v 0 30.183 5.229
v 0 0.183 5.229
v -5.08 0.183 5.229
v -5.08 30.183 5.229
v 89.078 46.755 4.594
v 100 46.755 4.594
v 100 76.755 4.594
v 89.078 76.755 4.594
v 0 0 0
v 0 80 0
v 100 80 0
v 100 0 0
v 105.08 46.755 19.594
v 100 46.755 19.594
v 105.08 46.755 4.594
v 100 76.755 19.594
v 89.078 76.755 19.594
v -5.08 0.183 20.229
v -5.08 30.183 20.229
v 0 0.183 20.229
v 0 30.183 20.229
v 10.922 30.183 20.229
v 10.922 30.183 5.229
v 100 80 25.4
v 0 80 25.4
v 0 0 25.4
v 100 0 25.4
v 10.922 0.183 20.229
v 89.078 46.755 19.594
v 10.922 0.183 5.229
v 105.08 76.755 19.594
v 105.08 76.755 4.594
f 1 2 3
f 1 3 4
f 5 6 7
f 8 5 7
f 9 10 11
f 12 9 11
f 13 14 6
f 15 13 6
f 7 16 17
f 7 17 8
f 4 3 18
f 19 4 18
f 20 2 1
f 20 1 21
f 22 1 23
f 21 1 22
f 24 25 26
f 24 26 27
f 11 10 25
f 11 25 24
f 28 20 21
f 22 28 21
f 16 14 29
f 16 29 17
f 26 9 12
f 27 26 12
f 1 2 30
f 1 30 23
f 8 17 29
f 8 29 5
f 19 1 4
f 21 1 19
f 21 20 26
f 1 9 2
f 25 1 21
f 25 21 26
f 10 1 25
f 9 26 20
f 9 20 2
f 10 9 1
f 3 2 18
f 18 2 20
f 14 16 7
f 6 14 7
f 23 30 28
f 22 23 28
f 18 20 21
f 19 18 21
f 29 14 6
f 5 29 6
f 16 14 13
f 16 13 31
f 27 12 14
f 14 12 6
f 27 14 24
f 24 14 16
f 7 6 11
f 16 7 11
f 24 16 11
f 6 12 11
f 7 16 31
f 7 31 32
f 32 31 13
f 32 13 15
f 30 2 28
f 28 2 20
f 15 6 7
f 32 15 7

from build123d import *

# Parameters (mm, degrees)
SKETCH2_W           = 100
SKETCH2_H           = 80
BOSS_EXTRUDE2_DEPTH = 25.4
SKETCH3_W           = 15
SKETCH3_H           = 30
CUT_EXTRUDE1_DEPTH  = 10.922
SKETCH4_W           = 15
SKETCH4_H           = 30
CUT_EXTRUDE2_DEPTH  = 10.922
SKETCH3_2_W         = 15
SKETCH3_2_H         = 30
BOSS_EXTRUDE3_DEPTH = 5.08
SKETCH4_2_W         = 15
SKETCH4_2_H         = 30
BOSS_EXTRUDE4_DEPTH = 5.08


with BuildPart() as part:
    # Sketch2 → Boss-Extrude2 (new body)
    with BuildSketch(Plane.XY):
        with Locations((50, 40)):
            Rectangle(SKETCH2_W, SKETCH2_H)
    extrude(amount=BOSS_EXTRUDE2_DEPTH)

    # Sketch3 → Cut-Extrude1 (cut)
    with BuildSketch(Plane(origin=(100, 0, 0), x_dir=(0, 0, -1), z_dir=(1, 0, 0))):
        with Locations((-12.093564274, 61.755363105)):
            Rectangle(SKETCH3_W, SKETCH3_H)
    extrude(amount=-CUT_EXTRUDE1_DEPTH, mode=Mode.SUBTRACT)

    # Sketch4 → Cut-Extrude2 (cut)
    with BuildSketch(Plane.ZY):
        with Locations((12.729363154, 15.183095109)):
            Rectangle(SKETCH4_W, SKETCH4_H)
    extrude(amount=-CUT_EXTRUDE2_DEPTH, mode=Mode.SUBTRACT)


with BuildPart() as body_2:
    # Sketch3<2> → Boss-Extrude3 (new body)
    with BuildSketch(Plane(origin=(100, 0, 0), x_dir=(0, 0, -1), z_dir=(1, 0, 0))):
        with Locations((-12.093564274, 61.755363105)):
            Rectangle(SKETCH3_2_W, SKETCH3_2_H)
    extrude(amount=BOSS_EXTRUDE3_DEPTH)


with BuildPart() as body_3:
    # Sketch4<2> → Boss-Extrude4 (new body)
    with BuildSketch(Plane.ZY):
        with Locations((12.729363154, 15.183095109)):
            Rectangle(SKETCH4_2_W, SKETCH4_2_H)
    extrude(amount=BOSS_EXTRUDE4_DEPTH)


solid = Compound([part.part, body_2.part, body_3.part])
